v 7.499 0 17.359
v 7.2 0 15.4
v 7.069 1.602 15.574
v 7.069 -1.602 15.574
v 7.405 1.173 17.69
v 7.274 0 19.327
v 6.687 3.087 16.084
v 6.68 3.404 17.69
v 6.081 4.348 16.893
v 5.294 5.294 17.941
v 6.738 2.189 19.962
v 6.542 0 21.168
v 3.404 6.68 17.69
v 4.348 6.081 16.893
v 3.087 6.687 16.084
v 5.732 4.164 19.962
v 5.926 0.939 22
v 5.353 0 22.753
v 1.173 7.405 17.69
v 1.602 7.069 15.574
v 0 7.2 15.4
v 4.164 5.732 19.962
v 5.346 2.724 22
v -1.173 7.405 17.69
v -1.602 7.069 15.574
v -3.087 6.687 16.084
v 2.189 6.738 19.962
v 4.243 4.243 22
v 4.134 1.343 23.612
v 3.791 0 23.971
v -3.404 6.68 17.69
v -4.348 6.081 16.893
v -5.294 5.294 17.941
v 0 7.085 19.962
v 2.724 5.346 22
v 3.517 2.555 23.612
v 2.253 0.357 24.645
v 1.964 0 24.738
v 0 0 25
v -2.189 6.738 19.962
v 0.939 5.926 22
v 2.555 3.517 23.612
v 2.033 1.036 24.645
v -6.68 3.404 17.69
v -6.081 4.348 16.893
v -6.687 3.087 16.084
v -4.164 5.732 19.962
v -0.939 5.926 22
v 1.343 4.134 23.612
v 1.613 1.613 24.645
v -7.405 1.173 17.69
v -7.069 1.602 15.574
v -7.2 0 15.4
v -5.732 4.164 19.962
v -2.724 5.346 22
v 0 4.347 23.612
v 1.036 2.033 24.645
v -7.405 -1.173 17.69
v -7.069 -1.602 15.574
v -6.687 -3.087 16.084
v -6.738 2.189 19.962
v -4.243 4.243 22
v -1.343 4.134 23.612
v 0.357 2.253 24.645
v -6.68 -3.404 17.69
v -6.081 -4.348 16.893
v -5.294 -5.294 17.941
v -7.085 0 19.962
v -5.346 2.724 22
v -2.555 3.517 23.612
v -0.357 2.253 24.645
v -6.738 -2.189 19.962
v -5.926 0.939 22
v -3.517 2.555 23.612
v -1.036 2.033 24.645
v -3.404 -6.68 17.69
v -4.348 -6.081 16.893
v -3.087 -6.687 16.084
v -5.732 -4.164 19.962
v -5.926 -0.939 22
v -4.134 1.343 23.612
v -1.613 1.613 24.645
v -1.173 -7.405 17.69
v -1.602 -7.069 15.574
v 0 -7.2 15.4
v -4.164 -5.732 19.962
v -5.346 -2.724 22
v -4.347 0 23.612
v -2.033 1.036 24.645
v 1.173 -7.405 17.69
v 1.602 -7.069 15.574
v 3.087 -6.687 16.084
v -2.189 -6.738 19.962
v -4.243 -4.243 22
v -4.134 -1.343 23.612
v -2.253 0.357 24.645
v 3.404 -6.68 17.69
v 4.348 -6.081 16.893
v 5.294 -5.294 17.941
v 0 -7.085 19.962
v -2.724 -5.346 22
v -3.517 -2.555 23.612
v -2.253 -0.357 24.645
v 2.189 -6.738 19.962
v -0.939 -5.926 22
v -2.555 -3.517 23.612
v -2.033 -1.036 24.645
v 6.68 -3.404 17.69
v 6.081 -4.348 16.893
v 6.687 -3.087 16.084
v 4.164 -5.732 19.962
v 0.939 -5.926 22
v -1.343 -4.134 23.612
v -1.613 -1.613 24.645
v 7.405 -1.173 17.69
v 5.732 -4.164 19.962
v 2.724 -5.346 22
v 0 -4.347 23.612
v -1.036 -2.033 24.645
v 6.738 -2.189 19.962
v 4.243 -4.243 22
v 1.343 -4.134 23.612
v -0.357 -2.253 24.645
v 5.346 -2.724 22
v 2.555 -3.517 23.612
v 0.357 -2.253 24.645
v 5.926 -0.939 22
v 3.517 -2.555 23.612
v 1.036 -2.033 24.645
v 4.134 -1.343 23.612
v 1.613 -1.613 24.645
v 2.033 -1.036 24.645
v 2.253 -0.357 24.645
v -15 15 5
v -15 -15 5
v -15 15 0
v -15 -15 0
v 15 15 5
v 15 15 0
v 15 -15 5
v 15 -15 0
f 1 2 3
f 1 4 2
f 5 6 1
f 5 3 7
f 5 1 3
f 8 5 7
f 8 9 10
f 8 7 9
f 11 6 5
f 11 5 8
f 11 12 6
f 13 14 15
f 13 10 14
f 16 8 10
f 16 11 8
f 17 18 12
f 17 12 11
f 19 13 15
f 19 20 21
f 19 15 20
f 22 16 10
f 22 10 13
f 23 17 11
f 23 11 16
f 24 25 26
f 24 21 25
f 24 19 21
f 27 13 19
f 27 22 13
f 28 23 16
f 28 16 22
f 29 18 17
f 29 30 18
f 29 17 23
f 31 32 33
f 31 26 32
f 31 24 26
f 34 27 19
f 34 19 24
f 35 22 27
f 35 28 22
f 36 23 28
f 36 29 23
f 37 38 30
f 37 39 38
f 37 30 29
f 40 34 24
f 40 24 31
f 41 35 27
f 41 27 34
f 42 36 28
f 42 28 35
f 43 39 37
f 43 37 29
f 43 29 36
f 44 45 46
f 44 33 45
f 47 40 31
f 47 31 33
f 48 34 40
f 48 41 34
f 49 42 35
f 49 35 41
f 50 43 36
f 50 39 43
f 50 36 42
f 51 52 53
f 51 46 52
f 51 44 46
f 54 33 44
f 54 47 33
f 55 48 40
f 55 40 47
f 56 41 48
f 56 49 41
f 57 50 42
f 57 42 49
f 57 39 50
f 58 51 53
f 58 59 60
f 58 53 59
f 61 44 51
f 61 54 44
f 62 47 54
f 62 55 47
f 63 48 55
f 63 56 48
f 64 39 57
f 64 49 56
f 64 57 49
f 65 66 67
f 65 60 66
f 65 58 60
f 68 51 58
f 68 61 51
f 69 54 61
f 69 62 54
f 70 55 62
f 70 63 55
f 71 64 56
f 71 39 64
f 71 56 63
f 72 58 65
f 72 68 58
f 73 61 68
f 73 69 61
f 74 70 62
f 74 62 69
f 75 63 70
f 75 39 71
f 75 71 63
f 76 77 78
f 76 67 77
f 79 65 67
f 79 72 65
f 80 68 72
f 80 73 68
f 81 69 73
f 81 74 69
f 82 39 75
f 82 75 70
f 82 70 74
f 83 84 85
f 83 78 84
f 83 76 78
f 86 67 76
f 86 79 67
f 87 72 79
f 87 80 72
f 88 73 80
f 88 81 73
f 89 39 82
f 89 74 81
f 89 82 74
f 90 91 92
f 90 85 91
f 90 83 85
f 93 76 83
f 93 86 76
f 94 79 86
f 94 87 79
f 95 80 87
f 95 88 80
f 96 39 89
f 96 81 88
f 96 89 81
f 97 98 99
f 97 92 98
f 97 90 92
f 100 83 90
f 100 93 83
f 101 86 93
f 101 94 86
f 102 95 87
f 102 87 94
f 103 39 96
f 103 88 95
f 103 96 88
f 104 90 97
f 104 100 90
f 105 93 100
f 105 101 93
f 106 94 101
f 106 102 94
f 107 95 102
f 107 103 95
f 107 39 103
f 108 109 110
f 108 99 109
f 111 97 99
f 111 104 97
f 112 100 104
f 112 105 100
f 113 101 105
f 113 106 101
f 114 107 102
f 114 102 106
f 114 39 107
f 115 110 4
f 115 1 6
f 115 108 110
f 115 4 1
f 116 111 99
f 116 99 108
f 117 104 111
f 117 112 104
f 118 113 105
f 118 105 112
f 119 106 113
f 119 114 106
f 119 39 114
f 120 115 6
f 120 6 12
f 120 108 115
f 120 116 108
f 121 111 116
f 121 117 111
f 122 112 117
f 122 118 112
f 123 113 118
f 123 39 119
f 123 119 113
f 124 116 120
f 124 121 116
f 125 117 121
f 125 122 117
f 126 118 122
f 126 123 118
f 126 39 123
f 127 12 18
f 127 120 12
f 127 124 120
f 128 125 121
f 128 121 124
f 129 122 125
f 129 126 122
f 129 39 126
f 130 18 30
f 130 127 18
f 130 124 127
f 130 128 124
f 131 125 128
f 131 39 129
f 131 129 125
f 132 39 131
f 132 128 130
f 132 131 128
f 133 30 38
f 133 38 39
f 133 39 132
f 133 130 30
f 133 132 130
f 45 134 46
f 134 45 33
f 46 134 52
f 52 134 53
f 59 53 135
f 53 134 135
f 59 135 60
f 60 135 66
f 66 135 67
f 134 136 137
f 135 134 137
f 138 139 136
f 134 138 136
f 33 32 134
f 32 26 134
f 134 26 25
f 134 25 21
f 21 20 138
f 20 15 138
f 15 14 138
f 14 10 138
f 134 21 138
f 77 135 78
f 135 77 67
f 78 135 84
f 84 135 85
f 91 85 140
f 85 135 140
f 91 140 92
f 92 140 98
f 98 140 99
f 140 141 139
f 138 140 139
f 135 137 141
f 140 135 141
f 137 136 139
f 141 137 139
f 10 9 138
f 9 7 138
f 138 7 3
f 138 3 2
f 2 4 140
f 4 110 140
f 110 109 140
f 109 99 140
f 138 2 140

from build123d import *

# Parameters (mm, degrees)
F1_DEPTH = 25
F4_DEPTH = 30.001
F5_DEPTH = 30.001


with BuildPart() as f1:
    # F0 (on Top) → F1 (new body)
    with BuildSketch(Plane.XY):
        Polygon((0, 0), (-15, 15), (-15, -15), align=None)
        Polygon((15, 15), (-15, 15), (0, 0), align=None)
        Polygon((15, -15), (15, 15), (0, 0), align=None)
        Polygon((0, 0), (-15, -15), (15, -15), align=None)
    extrude(amount=F1_DEPTH)

    # F3 (on face) → F4 (cut, through all)
    with BuildSketch(Plane.XZ.offset(15)):
        Polygon((-15, 25), (-15, 5), (0, 25), align=None)
        Polygon((0, 25), (15, 5), (15, 25), align=None)
    extrude(amount=-F4_DEPTH, mode=Mode.SUBTRACT)

    # F2 (on face) → F5 (cut, through all)
    with BuildSketch(Plane.YZ.offset(15)):
        Polygon((-15, 25), (-15, 5), (0, 25), align=None)
        Polygon((0, 25), (15, 5), (15, 25), align=None)
    extrude(amount=-F5_DEPTH, mode=Mode.SUBTRACT)

    # F6 (on Front) → F7 (revolve)
    with BuildSketch(Plane.XZ):
        with BuildLine():
            ThreePointArc((0, 10), (5.3033008589, 12.1966991411), (7.5, 17.5))
            ThreePointArc((7.5, 17.5), (5.3033008589, 22.8033008589), (0, 25))
            Line((0, 25), (0, 10))
        make_face()
    revolve(axis=Axis((0, 0, 17.5), (0, 0, 1)))


solid = f1.part
